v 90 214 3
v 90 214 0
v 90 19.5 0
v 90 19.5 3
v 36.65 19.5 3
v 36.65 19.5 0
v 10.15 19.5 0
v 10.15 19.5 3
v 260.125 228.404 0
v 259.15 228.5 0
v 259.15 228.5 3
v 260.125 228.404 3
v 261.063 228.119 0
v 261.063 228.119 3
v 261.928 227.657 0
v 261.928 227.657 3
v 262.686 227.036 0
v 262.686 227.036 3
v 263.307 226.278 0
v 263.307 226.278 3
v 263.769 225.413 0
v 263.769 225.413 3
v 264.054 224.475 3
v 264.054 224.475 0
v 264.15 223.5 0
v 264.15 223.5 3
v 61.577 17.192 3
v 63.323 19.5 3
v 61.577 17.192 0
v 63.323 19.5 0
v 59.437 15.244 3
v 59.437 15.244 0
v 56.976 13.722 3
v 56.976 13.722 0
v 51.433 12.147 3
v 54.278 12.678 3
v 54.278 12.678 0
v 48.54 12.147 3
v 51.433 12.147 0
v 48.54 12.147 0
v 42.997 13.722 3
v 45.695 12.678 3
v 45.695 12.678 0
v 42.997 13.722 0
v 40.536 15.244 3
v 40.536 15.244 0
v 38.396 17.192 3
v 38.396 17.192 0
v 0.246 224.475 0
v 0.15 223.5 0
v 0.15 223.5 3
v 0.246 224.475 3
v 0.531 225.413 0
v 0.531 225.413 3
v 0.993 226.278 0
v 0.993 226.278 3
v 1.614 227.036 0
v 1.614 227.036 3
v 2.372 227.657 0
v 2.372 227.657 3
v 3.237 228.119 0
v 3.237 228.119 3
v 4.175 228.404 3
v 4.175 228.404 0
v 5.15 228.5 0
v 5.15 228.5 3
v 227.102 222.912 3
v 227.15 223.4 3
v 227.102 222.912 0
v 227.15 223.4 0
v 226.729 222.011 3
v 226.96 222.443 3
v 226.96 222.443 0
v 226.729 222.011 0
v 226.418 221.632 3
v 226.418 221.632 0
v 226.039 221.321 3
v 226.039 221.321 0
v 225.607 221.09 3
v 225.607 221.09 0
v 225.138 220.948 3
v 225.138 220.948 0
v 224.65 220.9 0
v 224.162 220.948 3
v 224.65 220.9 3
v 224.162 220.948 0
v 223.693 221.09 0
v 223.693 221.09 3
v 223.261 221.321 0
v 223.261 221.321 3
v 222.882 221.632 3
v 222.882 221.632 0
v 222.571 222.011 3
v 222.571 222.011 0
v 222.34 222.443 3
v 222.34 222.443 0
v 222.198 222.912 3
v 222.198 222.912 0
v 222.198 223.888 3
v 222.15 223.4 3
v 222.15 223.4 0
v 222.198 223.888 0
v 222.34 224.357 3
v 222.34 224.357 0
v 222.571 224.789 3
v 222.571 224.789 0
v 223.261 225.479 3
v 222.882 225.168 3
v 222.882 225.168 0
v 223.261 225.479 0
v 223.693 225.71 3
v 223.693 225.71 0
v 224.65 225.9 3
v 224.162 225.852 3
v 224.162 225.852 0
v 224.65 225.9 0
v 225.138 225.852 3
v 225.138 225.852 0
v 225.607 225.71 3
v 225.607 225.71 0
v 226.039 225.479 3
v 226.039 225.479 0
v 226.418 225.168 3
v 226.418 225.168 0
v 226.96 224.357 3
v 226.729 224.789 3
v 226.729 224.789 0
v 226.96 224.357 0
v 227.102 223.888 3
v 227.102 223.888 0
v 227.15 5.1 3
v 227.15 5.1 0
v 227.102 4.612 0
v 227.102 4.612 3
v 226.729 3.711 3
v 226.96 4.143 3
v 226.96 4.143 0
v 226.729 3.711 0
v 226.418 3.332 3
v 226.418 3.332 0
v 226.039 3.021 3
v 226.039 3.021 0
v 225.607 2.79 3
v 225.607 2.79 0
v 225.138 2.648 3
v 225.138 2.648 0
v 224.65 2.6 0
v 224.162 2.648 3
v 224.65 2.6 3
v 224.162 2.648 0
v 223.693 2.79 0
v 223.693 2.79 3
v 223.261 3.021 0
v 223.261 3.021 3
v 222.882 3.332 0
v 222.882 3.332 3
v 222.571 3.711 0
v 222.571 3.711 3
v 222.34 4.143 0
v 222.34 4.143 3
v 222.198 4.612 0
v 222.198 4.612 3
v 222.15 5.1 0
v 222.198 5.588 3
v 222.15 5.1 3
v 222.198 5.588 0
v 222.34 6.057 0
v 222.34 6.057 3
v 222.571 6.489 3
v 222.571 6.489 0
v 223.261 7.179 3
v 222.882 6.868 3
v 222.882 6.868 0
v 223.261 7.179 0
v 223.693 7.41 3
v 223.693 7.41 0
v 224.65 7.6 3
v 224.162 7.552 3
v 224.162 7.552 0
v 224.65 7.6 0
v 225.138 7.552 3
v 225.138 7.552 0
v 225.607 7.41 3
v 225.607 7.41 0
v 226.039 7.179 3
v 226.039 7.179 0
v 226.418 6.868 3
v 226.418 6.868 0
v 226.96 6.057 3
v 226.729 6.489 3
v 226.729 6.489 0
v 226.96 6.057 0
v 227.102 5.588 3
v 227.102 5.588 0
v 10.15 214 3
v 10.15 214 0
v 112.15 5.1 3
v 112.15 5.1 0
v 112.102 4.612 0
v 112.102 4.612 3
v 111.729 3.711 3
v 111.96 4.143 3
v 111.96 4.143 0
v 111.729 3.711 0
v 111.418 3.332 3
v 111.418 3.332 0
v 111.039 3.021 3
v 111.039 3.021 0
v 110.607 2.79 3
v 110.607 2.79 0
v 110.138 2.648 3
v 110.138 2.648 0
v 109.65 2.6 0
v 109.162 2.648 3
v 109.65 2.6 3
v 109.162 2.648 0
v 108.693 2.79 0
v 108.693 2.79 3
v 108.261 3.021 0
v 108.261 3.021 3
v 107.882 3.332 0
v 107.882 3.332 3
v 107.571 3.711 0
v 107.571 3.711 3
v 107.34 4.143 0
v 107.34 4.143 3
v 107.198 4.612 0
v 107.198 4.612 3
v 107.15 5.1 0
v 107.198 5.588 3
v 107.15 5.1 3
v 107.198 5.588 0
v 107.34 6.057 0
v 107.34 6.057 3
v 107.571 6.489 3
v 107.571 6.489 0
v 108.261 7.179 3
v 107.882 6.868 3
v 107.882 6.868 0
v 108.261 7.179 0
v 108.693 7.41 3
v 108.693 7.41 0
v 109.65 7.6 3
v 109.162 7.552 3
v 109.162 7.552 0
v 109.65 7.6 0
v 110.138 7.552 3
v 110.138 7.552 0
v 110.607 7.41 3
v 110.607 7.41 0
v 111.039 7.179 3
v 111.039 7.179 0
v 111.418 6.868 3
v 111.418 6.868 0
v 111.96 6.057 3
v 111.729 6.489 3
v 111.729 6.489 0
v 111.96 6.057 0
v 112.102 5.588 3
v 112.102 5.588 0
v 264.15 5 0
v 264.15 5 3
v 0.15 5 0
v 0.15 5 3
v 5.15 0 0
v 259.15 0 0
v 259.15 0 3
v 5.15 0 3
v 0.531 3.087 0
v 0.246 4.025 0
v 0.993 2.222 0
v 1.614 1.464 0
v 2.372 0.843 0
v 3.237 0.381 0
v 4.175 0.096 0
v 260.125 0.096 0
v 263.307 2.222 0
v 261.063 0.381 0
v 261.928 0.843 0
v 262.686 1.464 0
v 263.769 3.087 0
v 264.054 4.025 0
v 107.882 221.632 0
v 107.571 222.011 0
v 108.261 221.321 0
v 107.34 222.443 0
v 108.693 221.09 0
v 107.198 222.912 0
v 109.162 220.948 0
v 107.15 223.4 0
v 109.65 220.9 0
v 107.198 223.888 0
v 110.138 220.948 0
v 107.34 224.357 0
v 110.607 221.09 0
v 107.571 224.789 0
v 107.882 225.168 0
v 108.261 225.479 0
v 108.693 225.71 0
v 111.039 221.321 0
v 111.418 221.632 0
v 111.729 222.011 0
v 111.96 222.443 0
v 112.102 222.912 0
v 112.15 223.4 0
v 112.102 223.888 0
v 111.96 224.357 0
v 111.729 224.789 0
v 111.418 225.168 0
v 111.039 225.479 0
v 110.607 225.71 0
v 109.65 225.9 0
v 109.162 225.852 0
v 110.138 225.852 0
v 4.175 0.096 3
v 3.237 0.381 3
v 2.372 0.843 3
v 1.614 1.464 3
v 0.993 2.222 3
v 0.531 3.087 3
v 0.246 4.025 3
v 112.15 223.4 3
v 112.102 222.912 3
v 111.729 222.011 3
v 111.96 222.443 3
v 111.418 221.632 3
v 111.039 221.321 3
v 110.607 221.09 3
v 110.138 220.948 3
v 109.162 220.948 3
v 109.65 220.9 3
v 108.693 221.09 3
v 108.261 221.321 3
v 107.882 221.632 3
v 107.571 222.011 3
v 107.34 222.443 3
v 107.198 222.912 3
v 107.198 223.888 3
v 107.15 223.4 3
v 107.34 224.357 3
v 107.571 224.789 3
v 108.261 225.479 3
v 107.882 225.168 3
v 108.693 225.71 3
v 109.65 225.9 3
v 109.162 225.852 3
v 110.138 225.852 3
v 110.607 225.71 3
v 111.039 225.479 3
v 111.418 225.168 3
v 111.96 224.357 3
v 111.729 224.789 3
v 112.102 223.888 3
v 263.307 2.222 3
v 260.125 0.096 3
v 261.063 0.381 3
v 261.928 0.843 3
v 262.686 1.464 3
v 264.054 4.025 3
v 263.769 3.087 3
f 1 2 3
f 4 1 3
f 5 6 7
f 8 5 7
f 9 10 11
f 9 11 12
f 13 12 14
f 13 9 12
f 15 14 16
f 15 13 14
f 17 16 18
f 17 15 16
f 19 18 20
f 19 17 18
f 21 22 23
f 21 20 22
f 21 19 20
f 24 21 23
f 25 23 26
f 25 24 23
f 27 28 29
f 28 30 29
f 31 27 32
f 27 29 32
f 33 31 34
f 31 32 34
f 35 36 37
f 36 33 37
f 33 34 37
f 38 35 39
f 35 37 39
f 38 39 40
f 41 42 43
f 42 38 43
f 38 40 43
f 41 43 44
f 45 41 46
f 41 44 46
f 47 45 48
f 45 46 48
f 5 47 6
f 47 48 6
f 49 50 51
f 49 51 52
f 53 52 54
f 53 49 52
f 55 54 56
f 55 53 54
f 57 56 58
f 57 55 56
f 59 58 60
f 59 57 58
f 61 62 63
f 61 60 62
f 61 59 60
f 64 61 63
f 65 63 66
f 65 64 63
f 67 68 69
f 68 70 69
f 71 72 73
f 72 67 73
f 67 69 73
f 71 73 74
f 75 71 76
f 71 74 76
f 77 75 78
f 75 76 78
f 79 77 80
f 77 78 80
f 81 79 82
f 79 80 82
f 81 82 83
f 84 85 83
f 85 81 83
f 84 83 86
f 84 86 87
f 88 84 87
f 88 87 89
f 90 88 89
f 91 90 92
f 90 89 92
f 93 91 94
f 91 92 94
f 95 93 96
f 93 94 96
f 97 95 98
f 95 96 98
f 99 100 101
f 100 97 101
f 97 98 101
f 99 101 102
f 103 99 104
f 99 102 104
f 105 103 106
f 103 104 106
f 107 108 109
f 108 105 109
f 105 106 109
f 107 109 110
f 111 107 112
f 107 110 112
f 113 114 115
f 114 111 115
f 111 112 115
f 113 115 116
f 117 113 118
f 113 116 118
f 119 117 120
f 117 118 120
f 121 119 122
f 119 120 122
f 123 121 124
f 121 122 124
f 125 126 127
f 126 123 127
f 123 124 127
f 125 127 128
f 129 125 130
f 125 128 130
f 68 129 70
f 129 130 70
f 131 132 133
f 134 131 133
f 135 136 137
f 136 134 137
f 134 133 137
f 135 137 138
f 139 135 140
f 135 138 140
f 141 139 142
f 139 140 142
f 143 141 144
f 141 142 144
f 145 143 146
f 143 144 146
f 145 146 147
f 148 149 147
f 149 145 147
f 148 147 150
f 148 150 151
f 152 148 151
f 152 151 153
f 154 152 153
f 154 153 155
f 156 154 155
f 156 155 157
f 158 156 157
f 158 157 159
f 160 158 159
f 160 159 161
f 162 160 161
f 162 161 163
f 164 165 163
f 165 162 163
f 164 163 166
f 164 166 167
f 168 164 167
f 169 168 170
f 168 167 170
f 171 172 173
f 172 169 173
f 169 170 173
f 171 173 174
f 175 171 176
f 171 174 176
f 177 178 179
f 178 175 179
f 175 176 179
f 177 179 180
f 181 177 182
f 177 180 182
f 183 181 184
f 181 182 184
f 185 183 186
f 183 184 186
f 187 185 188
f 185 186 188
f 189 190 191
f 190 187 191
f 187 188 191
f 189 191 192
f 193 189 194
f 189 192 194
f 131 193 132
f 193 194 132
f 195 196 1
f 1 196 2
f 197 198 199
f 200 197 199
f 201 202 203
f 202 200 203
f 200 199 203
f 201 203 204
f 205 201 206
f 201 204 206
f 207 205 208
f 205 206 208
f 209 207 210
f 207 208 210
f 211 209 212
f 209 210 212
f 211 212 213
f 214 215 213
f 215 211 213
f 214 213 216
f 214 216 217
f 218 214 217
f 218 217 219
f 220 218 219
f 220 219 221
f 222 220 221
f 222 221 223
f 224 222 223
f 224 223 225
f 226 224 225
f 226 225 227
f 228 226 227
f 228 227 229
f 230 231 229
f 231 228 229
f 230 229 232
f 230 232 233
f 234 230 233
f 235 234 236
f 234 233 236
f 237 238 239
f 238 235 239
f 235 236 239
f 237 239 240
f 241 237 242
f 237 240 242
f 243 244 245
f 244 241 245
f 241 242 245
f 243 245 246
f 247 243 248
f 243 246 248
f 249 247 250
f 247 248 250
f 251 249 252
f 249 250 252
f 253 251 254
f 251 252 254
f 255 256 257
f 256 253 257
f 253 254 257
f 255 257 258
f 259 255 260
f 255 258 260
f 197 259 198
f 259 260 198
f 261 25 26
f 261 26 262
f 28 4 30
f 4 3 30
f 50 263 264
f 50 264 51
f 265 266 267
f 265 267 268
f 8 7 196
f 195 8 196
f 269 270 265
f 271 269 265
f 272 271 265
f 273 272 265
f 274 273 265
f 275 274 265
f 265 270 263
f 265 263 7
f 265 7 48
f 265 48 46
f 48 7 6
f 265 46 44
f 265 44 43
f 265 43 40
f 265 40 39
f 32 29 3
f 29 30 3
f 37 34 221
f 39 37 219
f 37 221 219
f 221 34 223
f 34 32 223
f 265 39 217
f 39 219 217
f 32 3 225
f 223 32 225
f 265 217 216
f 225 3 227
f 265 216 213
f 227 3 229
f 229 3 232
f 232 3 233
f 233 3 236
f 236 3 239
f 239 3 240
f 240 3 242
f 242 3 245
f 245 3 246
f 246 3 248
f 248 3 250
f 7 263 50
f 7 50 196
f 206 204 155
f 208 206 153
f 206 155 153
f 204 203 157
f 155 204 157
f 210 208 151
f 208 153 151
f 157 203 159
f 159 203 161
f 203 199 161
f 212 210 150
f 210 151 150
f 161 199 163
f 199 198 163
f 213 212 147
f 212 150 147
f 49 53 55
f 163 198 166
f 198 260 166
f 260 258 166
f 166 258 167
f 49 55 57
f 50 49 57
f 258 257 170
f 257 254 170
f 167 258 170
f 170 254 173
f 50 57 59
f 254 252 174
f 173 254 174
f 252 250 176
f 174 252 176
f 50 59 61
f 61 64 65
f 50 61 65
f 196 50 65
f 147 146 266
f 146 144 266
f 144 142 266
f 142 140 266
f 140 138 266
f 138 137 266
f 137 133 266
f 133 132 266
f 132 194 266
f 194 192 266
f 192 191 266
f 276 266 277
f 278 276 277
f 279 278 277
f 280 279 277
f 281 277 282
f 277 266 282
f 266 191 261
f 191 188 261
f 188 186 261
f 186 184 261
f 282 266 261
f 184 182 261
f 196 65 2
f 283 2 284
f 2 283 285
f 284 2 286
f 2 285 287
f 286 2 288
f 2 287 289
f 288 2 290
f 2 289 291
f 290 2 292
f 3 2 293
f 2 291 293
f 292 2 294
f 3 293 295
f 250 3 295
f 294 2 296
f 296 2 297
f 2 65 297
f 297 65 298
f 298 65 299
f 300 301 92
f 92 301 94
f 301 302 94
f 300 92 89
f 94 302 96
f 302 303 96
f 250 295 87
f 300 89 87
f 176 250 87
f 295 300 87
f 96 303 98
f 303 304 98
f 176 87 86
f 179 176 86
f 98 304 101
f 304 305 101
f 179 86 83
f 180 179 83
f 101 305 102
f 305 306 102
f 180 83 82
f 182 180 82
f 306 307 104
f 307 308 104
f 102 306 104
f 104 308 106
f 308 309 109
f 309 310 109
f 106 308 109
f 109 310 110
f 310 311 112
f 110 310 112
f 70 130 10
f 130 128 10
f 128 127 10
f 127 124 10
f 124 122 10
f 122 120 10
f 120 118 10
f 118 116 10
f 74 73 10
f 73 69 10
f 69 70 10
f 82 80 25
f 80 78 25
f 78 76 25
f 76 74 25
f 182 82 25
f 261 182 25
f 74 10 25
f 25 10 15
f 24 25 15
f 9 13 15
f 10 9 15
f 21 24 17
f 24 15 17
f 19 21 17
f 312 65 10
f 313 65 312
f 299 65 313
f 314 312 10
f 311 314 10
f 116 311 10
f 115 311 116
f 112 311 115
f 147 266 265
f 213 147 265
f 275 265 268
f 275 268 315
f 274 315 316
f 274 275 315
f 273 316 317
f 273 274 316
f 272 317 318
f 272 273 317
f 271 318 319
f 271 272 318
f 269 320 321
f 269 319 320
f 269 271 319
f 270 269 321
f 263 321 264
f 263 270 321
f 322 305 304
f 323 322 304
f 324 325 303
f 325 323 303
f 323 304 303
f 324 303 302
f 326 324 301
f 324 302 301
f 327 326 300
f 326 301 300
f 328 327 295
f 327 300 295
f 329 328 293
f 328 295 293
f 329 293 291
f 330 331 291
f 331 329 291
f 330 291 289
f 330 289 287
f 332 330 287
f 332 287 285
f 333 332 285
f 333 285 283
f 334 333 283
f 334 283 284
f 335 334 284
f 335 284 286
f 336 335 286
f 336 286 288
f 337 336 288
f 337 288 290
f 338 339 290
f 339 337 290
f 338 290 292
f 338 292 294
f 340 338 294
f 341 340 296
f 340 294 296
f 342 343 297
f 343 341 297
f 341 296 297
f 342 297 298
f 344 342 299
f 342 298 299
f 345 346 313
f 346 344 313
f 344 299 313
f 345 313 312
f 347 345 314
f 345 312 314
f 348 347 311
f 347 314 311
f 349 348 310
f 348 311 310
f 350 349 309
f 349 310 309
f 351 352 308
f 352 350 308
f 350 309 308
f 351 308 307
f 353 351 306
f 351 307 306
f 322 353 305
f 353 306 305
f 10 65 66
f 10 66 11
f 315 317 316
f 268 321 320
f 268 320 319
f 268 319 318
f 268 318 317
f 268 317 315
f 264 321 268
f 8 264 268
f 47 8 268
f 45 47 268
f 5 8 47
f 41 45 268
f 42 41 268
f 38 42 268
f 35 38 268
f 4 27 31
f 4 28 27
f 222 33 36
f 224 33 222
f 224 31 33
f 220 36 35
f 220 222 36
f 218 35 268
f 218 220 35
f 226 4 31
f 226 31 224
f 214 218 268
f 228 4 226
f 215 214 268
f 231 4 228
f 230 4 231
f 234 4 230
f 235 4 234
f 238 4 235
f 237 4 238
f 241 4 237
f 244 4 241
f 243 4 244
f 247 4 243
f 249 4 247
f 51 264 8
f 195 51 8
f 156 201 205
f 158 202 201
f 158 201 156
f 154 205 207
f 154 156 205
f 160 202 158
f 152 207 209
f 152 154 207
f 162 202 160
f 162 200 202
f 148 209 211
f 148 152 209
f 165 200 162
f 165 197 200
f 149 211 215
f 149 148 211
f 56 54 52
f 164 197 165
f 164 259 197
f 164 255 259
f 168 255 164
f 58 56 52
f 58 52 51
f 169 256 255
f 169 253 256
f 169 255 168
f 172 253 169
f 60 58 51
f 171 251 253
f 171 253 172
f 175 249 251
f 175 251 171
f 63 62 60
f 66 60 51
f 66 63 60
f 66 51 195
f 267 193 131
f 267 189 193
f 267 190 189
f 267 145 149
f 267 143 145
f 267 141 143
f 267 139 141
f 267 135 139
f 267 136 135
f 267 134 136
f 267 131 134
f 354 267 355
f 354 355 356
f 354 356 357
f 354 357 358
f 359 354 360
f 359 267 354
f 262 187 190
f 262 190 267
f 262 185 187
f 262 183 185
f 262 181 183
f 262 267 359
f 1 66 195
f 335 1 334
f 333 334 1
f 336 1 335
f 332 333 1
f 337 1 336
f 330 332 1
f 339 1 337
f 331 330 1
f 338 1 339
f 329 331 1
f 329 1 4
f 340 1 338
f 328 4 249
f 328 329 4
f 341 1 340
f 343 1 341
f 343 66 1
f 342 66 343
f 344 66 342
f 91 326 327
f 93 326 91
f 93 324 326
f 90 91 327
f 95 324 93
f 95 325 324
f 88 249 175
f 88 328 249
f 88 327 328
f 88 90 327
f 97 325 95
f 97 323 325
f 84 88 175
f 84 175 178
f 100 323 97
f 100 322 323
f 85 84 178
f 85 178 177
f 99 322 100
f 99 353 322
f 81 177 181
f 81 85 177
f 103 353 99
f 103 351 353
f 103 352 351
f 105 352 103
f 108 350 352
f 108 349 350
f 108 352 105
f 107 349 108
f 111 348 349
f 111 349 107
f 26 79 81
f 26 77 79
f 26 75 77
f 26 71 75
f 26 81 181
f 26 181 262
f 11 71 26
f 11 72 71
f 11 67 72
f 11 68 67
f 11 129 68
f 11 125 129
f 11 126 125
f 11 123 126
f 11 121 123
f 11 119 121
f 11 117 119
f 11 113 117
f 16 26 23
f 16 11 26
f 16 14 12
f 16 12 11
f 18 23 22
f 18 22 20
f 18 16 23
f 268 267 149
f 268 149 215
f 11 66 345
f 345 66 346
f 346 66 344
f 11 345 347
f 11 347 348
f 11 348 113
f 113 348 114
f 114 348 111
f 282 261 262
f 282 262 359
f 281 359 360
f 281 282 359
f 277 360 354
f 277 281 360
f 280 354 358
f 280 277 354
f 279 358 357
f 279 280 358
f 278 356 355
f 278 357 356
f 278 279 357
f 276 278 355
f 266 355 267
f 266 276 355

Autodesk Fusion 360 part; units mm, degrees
sketch "Top Panel" plane through (0, 0, 0) normal (0, 0, 1) x (1, 0, 0)
  line L0 (5.15, 228.5) -> (259.15, 228.5)
  line L1 (264.15, 223.5) -> (264.15, 5)
  line L2 (259.15, 0) -> (5.15, 0)
  line L3 (0.15, 5) -> (0.15, 223.5)
  line L4 (10.15, 214) -> (90, 214)
  line L5 (90, 214) -> (90, 19.5)
  line L6 (10.15, 19.5) -> (10.15, 214)
  line L7 (50.075, 27.7654) -> (10.15, 27.7654) construction
  line L8 (50.075, 27.7654) -> (90, 27.7654) construction
  line L9 (50.075, 27.7654) -> (50.075, 12) construction
  arc A0 (36.65, 19.5) -> (63.323, 19.5) centre (49.9865, 27.7752) ccw
  arc A1 (264.15, 223.5) -> (259.15, 228.5) centre (259.15, 223.5) ccw
  arc A2 (259.15, 0) -> (264.15, 5) centre (259.15, 5) ccw
  arc A3 (0.15, 5) -> (5.15, 0) centre (5.15, 5) ccw
  arc A4 (5.15, 228.5) -> (0.15, 223.5) centre (5.15, 223.5) ccw
  circle A5 centre (109.65, 5.1) radius 2.5
  line L10 (109.65, 5.1) -> (107.15, 5.1) construction
  line L11 (109.65, 5.1) -> (109.65, 2.6) construction
  line L12 (109.65, 2.6) -> (109.65, 0) construction
  line L13 (107.15, 5.1) -> (0.15, 5.1) construction
  circle A6 centre (224.65, 5.1) radius 2.5
  line L14 (224.65, 5.1) -> (227.15, 5.1) construction
  line L15 (224.65, 2.6) -> (224.65, 5.1) construction
  line L16 (224.65, 2.6) -> (224.65, 0) construction
  line L17 (227.15, 5.1) -> (264.15, 5.1) construction
  circle A7 centre (109.65, 223.4) radius 2.5
  circle A8 centre (224.65, 223.4) radius 2.5
  line L18 (109.65, 223.4) -> (107.15, 223.4) construction
  line L19 (109.65, 223.4) -> (109.65, 225.9) construction
  line L20 (107.15, 223.4) -> (0.15, 223.4) construction
  line L21 (224.65, 223.4) -> (224.65, 225.9) construction
  line L22 (224.65, 223.4) -> (227.15, 223.4) construction
  line L23 (224.65, 225.9) -> (224.65, 228.5) construction
  line L24 (227.15, 223.4) -> (264.15, 223.4) construction
  line L25 (109.65, 225.9) -> (109.65, 228.5) construction
  line L26 (90, 19.5) -> (63.323, 19.5)
  line L27 (36.65, 19.5) -> (10.15, 19.5)
  point P0 (36.65, 19.5)
  dimension "d1" = 264
  dimension "d2" = 228.5
  dimension "d3" = 79.85
  dimension "d4" = 10
  dimension "d6" = 14.5
  dimension "d8" = 12
  dimension "d9" = 26.5
  dimension "d10" = 5
  dimension "d17" = 2.6
  dimension "d18" = 107
  dimension "d19" = 2.5
  dimension "d20" = 37
extrude "Extrude1" add sketch "Top Panel" along normal blind 3
